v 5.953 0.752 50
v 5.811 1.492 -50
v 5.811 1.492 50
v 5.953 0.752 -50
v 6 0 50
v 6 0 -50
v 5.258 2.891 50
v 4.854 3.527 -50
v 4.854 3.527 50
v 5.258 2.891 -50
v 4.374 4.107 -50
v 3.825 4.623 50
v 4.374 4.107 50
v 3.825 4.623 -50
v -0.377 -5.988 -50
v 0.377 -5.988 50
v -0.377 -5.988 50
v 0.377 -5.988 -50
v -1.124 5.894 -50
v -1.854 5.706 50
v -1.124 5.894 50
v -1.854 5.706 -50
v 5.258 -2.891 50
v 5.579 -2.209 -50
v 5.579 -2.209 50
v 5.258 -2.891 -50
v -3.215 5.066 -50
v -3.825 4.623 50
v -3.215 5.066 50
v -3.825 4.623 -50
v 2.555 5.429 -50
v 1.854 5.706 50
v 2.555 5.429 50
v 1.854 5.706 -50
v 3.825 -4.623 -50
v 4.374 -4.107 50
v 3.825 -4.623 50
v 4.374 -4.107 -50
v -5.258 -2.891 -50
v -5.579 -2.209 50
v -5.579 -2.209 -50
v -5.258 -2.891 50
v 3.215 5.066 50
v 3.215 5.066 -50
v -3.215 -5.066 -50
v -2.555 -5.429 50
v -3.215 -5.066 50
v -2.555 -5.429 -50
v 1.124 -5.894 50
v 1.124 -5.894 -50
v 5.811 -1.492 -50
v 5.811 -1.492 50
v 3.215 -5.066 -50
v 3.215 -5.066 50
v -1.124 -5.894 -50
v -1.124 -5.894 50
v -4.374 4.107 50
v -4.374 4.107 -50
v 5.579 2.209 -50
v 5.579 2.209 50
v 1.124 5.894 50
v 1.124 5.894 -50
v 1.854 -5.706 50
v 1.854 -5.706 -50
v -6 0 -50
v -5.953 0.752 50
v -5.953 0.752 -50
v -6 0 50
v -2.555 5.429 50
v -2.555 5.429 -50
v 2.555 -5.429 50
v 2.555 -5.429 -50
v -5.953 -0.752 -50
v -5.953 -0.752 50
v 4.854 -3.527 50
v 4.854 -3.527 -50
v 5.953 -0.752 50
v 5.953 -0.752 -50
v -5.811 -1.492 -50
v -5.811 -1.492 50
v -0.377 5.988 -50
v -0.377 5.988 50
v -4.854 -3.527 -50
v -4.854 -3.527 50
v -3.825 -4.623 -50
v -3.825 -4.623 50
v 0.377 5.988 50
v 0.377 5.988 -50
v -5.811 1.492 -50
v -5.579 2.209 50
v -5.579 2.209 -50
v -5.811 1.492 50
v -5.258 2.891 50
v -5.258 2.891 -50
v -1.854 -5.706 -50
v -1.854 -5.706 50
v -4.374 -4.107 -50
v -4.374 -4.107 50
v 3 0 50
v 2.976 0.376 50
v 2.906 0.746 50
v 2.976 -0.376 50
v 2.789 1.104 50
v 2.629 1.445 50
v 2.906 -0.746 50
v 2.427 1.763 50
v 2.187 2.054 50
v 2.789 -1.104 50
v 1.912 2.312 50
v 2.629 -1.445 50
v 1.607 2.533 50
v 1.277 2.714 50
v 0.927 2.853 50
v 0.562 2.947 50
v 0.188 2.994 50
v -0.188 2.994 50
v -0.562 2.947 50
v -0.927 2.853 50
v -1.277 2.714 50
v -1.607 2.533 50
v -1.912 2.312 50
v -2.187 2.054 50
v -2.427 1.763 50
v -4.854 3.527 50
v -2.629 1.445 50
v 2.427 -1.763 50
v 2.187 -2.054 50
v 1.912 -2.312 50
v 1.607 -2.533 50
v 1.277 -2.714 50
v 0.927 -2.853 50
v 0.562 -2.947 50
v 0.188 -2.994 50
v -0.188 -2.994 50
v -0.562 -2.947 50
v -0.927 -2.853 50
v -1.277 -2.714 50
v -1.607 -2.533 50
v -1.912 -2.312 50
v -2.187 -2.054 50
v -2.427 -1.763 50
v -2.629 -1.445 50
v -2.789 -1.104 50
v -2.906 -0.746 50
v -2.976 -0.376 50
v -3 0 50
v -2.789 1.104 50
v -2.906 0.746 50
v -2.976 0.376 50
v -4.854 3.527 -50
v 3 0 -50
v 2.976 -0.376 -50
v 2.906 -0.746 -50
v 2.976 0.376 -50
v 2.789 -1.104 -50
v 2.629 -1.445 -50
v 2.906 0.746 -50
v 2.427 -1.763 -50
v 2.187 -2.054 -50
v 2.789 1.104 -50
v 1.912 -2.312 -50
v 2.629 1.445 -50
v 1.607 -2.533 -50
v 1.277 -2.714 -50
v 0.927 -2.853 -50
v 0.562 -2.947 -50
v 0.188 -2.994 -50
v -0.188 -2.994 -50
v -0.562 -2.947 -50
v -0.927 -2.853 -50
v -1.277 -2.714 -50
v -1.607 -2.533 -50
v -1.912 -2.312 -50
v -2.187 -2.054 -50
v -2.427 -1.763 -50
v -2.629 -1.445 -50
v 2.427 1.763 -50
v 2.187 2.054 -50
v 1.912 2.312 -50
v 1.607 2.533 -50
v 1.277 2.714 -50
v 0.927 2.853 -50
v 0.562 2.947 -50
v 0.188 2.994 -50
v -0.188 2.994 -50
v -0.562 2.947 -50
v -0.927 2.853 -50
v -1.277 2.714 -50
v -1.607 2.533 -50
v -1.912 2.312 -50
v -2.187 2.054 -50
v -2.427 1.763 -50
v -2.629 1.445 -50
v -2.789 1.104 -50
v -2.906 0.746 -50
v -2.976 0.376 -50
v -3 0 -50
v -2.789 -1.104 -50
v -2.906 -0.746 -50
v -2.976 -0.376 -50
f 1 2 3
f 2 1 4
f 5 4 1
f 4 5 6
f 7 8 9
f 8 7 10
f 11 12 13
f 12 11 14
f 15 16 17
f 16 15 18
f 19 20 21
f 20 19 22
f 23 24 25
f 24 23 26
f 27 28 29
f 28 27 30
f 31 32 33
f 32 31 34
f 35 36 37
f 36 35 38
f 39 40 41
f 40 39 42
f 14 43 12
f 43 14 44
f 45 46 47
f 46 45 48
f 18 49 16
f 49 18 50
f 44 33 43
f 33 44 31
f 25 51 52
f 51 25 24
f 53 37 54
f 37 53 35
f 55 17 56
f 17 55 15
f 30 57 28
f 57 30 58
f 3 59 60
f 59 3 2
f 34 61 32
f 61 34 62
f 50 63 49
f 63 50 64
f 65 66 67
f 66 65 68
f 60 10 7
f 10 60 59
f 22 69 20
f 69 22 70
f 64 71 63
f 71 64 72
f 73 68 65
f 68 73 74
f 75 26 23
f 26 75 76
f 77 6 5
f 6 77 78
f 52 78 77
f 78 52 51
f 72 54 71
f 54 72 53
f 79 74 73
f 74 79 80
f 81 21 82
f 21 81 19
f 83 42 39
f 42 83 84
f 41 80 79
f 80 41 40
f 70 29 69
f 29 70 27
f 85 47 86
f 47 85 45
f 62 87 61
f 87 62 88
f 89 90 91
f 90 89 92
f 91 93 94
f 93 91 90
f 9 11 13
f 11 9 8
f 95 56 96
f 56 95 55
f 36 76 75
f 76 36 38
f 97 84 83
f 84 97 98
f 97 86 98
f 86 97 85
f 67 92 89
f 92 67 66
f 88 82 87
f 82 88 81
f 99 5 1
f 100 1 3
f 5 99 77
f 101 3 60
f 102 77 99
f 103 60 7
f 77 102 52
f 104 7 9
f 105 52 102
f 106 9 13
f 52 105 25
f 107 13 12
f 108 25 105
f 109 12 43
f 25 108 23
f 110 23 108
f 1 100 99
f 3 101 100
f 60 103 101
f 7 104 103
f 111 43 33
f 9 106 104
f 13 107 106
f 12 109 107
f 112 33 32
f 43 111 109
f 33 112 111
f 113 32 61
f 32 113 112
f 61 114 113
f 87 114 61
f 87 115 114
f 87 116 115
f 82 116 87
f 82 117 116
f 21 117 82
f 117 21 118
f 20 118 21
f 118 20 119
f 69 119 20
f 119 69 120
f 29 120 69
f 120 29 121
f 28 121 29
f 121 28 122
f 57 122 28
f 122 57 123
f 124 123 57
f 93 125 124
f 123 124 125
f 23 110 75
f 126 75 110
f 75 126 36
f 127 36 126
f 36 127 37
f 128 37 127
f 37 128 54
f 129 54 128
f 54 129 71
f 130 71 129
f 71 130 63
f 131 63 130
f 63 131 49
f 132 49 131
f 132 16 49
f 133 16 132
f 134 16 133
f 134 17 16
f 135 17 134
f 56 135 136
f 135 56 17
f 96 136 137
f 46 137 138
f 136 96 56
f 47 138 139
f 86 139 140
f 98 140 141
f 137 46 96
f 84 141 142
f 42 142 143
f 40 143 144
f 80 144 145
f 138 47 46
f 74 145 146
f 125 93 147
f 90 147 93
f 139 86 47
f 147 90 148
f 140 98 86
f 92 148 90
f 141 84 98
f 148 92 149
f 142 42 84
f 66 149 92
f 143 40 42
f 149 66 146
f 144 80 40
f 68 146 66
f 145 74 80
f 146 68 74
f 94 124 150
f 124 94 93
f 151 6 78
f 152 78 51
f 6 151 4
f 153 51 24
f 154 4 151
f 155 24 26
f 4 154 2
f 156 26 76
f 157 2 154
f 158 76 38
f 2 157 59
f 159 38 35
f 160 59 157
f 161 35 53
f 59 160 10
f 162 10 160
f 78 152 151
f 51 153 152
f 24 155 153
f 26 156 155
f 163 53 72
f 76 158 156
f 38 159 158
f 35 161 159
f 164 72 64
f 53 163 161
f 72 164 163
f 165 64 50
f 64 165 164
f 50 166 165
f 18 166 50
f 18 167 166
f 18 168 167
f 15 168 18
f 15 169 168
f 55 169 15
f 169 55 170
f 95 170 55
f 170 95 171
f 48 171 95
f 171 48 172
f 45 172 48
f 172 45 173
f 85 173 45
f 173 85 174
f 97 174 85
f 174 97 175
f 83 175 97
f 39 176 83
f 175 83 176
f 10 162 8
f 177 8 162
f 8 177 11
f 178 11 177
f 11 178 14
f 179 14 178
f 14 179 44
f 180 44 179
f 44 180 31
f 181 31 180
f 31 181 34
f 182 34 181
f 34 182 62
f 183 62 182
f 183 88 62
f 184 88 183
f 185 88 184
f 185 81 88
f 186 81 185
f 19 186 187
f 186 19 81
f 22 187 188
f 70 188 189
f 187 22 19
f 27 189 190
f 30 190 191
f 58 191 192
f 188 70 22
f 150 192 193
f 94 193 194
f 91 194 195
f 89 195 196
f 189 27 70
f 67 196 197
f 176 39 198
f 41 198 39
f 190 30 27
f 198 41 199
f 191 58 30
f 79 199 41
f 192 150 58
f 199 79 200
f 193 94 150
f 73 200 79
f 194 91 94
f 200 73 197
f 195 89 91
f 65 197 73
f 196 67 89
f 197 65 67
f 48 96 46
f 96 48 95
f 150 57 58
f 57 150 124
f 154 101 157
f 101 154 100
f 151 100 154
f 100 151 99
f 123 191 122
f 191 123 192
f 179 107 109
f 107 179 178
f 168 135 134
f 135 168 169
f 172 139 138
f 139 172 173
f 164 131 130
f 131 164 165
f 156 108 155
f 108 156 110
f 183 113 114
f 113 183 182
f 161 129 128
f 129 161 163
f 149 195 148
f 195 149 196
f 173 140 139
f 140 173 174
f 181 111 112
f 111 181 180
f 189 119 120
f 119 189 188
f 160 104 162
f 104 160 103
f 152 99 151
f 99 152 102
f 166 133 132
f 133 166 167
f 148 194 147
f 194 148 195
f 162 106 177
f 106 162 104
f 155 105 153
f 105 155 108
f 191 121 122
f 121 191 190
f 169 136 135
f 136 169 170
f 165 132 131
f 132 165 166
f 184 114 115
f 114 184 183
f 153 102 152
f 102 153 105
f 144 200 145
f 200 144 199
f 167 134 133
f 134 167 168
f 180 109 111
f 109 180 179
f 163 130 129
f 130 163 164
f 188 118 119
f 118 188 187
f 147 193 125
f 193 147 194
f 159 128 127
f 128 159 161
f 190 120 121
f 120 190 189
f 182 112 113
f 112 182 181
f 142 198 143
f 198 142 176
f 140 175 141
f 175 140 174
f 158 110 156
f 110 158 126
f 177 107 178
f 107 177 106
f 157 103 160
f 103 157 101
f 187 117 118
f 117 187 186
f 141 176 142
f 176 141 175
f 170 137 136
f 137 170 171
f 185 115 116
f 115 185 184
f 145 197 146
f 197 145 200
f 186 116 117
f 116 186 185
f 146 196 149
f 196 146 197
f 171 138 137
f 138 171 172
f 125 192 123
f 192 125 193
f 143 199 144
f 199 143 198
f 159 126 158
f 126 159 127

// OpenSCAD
$fn = 50;


difference() {
	union() {
		translate(v = [0, 0, -50.0000000000]) {
			cylinder(h = 100, r = 6.0000000000);
		}
	}
	union() {
		translate(v = [0, 0, -100.0000000000]) {
			cylinder(h = 200, r = 3.0000000000);
		}
	}
}
